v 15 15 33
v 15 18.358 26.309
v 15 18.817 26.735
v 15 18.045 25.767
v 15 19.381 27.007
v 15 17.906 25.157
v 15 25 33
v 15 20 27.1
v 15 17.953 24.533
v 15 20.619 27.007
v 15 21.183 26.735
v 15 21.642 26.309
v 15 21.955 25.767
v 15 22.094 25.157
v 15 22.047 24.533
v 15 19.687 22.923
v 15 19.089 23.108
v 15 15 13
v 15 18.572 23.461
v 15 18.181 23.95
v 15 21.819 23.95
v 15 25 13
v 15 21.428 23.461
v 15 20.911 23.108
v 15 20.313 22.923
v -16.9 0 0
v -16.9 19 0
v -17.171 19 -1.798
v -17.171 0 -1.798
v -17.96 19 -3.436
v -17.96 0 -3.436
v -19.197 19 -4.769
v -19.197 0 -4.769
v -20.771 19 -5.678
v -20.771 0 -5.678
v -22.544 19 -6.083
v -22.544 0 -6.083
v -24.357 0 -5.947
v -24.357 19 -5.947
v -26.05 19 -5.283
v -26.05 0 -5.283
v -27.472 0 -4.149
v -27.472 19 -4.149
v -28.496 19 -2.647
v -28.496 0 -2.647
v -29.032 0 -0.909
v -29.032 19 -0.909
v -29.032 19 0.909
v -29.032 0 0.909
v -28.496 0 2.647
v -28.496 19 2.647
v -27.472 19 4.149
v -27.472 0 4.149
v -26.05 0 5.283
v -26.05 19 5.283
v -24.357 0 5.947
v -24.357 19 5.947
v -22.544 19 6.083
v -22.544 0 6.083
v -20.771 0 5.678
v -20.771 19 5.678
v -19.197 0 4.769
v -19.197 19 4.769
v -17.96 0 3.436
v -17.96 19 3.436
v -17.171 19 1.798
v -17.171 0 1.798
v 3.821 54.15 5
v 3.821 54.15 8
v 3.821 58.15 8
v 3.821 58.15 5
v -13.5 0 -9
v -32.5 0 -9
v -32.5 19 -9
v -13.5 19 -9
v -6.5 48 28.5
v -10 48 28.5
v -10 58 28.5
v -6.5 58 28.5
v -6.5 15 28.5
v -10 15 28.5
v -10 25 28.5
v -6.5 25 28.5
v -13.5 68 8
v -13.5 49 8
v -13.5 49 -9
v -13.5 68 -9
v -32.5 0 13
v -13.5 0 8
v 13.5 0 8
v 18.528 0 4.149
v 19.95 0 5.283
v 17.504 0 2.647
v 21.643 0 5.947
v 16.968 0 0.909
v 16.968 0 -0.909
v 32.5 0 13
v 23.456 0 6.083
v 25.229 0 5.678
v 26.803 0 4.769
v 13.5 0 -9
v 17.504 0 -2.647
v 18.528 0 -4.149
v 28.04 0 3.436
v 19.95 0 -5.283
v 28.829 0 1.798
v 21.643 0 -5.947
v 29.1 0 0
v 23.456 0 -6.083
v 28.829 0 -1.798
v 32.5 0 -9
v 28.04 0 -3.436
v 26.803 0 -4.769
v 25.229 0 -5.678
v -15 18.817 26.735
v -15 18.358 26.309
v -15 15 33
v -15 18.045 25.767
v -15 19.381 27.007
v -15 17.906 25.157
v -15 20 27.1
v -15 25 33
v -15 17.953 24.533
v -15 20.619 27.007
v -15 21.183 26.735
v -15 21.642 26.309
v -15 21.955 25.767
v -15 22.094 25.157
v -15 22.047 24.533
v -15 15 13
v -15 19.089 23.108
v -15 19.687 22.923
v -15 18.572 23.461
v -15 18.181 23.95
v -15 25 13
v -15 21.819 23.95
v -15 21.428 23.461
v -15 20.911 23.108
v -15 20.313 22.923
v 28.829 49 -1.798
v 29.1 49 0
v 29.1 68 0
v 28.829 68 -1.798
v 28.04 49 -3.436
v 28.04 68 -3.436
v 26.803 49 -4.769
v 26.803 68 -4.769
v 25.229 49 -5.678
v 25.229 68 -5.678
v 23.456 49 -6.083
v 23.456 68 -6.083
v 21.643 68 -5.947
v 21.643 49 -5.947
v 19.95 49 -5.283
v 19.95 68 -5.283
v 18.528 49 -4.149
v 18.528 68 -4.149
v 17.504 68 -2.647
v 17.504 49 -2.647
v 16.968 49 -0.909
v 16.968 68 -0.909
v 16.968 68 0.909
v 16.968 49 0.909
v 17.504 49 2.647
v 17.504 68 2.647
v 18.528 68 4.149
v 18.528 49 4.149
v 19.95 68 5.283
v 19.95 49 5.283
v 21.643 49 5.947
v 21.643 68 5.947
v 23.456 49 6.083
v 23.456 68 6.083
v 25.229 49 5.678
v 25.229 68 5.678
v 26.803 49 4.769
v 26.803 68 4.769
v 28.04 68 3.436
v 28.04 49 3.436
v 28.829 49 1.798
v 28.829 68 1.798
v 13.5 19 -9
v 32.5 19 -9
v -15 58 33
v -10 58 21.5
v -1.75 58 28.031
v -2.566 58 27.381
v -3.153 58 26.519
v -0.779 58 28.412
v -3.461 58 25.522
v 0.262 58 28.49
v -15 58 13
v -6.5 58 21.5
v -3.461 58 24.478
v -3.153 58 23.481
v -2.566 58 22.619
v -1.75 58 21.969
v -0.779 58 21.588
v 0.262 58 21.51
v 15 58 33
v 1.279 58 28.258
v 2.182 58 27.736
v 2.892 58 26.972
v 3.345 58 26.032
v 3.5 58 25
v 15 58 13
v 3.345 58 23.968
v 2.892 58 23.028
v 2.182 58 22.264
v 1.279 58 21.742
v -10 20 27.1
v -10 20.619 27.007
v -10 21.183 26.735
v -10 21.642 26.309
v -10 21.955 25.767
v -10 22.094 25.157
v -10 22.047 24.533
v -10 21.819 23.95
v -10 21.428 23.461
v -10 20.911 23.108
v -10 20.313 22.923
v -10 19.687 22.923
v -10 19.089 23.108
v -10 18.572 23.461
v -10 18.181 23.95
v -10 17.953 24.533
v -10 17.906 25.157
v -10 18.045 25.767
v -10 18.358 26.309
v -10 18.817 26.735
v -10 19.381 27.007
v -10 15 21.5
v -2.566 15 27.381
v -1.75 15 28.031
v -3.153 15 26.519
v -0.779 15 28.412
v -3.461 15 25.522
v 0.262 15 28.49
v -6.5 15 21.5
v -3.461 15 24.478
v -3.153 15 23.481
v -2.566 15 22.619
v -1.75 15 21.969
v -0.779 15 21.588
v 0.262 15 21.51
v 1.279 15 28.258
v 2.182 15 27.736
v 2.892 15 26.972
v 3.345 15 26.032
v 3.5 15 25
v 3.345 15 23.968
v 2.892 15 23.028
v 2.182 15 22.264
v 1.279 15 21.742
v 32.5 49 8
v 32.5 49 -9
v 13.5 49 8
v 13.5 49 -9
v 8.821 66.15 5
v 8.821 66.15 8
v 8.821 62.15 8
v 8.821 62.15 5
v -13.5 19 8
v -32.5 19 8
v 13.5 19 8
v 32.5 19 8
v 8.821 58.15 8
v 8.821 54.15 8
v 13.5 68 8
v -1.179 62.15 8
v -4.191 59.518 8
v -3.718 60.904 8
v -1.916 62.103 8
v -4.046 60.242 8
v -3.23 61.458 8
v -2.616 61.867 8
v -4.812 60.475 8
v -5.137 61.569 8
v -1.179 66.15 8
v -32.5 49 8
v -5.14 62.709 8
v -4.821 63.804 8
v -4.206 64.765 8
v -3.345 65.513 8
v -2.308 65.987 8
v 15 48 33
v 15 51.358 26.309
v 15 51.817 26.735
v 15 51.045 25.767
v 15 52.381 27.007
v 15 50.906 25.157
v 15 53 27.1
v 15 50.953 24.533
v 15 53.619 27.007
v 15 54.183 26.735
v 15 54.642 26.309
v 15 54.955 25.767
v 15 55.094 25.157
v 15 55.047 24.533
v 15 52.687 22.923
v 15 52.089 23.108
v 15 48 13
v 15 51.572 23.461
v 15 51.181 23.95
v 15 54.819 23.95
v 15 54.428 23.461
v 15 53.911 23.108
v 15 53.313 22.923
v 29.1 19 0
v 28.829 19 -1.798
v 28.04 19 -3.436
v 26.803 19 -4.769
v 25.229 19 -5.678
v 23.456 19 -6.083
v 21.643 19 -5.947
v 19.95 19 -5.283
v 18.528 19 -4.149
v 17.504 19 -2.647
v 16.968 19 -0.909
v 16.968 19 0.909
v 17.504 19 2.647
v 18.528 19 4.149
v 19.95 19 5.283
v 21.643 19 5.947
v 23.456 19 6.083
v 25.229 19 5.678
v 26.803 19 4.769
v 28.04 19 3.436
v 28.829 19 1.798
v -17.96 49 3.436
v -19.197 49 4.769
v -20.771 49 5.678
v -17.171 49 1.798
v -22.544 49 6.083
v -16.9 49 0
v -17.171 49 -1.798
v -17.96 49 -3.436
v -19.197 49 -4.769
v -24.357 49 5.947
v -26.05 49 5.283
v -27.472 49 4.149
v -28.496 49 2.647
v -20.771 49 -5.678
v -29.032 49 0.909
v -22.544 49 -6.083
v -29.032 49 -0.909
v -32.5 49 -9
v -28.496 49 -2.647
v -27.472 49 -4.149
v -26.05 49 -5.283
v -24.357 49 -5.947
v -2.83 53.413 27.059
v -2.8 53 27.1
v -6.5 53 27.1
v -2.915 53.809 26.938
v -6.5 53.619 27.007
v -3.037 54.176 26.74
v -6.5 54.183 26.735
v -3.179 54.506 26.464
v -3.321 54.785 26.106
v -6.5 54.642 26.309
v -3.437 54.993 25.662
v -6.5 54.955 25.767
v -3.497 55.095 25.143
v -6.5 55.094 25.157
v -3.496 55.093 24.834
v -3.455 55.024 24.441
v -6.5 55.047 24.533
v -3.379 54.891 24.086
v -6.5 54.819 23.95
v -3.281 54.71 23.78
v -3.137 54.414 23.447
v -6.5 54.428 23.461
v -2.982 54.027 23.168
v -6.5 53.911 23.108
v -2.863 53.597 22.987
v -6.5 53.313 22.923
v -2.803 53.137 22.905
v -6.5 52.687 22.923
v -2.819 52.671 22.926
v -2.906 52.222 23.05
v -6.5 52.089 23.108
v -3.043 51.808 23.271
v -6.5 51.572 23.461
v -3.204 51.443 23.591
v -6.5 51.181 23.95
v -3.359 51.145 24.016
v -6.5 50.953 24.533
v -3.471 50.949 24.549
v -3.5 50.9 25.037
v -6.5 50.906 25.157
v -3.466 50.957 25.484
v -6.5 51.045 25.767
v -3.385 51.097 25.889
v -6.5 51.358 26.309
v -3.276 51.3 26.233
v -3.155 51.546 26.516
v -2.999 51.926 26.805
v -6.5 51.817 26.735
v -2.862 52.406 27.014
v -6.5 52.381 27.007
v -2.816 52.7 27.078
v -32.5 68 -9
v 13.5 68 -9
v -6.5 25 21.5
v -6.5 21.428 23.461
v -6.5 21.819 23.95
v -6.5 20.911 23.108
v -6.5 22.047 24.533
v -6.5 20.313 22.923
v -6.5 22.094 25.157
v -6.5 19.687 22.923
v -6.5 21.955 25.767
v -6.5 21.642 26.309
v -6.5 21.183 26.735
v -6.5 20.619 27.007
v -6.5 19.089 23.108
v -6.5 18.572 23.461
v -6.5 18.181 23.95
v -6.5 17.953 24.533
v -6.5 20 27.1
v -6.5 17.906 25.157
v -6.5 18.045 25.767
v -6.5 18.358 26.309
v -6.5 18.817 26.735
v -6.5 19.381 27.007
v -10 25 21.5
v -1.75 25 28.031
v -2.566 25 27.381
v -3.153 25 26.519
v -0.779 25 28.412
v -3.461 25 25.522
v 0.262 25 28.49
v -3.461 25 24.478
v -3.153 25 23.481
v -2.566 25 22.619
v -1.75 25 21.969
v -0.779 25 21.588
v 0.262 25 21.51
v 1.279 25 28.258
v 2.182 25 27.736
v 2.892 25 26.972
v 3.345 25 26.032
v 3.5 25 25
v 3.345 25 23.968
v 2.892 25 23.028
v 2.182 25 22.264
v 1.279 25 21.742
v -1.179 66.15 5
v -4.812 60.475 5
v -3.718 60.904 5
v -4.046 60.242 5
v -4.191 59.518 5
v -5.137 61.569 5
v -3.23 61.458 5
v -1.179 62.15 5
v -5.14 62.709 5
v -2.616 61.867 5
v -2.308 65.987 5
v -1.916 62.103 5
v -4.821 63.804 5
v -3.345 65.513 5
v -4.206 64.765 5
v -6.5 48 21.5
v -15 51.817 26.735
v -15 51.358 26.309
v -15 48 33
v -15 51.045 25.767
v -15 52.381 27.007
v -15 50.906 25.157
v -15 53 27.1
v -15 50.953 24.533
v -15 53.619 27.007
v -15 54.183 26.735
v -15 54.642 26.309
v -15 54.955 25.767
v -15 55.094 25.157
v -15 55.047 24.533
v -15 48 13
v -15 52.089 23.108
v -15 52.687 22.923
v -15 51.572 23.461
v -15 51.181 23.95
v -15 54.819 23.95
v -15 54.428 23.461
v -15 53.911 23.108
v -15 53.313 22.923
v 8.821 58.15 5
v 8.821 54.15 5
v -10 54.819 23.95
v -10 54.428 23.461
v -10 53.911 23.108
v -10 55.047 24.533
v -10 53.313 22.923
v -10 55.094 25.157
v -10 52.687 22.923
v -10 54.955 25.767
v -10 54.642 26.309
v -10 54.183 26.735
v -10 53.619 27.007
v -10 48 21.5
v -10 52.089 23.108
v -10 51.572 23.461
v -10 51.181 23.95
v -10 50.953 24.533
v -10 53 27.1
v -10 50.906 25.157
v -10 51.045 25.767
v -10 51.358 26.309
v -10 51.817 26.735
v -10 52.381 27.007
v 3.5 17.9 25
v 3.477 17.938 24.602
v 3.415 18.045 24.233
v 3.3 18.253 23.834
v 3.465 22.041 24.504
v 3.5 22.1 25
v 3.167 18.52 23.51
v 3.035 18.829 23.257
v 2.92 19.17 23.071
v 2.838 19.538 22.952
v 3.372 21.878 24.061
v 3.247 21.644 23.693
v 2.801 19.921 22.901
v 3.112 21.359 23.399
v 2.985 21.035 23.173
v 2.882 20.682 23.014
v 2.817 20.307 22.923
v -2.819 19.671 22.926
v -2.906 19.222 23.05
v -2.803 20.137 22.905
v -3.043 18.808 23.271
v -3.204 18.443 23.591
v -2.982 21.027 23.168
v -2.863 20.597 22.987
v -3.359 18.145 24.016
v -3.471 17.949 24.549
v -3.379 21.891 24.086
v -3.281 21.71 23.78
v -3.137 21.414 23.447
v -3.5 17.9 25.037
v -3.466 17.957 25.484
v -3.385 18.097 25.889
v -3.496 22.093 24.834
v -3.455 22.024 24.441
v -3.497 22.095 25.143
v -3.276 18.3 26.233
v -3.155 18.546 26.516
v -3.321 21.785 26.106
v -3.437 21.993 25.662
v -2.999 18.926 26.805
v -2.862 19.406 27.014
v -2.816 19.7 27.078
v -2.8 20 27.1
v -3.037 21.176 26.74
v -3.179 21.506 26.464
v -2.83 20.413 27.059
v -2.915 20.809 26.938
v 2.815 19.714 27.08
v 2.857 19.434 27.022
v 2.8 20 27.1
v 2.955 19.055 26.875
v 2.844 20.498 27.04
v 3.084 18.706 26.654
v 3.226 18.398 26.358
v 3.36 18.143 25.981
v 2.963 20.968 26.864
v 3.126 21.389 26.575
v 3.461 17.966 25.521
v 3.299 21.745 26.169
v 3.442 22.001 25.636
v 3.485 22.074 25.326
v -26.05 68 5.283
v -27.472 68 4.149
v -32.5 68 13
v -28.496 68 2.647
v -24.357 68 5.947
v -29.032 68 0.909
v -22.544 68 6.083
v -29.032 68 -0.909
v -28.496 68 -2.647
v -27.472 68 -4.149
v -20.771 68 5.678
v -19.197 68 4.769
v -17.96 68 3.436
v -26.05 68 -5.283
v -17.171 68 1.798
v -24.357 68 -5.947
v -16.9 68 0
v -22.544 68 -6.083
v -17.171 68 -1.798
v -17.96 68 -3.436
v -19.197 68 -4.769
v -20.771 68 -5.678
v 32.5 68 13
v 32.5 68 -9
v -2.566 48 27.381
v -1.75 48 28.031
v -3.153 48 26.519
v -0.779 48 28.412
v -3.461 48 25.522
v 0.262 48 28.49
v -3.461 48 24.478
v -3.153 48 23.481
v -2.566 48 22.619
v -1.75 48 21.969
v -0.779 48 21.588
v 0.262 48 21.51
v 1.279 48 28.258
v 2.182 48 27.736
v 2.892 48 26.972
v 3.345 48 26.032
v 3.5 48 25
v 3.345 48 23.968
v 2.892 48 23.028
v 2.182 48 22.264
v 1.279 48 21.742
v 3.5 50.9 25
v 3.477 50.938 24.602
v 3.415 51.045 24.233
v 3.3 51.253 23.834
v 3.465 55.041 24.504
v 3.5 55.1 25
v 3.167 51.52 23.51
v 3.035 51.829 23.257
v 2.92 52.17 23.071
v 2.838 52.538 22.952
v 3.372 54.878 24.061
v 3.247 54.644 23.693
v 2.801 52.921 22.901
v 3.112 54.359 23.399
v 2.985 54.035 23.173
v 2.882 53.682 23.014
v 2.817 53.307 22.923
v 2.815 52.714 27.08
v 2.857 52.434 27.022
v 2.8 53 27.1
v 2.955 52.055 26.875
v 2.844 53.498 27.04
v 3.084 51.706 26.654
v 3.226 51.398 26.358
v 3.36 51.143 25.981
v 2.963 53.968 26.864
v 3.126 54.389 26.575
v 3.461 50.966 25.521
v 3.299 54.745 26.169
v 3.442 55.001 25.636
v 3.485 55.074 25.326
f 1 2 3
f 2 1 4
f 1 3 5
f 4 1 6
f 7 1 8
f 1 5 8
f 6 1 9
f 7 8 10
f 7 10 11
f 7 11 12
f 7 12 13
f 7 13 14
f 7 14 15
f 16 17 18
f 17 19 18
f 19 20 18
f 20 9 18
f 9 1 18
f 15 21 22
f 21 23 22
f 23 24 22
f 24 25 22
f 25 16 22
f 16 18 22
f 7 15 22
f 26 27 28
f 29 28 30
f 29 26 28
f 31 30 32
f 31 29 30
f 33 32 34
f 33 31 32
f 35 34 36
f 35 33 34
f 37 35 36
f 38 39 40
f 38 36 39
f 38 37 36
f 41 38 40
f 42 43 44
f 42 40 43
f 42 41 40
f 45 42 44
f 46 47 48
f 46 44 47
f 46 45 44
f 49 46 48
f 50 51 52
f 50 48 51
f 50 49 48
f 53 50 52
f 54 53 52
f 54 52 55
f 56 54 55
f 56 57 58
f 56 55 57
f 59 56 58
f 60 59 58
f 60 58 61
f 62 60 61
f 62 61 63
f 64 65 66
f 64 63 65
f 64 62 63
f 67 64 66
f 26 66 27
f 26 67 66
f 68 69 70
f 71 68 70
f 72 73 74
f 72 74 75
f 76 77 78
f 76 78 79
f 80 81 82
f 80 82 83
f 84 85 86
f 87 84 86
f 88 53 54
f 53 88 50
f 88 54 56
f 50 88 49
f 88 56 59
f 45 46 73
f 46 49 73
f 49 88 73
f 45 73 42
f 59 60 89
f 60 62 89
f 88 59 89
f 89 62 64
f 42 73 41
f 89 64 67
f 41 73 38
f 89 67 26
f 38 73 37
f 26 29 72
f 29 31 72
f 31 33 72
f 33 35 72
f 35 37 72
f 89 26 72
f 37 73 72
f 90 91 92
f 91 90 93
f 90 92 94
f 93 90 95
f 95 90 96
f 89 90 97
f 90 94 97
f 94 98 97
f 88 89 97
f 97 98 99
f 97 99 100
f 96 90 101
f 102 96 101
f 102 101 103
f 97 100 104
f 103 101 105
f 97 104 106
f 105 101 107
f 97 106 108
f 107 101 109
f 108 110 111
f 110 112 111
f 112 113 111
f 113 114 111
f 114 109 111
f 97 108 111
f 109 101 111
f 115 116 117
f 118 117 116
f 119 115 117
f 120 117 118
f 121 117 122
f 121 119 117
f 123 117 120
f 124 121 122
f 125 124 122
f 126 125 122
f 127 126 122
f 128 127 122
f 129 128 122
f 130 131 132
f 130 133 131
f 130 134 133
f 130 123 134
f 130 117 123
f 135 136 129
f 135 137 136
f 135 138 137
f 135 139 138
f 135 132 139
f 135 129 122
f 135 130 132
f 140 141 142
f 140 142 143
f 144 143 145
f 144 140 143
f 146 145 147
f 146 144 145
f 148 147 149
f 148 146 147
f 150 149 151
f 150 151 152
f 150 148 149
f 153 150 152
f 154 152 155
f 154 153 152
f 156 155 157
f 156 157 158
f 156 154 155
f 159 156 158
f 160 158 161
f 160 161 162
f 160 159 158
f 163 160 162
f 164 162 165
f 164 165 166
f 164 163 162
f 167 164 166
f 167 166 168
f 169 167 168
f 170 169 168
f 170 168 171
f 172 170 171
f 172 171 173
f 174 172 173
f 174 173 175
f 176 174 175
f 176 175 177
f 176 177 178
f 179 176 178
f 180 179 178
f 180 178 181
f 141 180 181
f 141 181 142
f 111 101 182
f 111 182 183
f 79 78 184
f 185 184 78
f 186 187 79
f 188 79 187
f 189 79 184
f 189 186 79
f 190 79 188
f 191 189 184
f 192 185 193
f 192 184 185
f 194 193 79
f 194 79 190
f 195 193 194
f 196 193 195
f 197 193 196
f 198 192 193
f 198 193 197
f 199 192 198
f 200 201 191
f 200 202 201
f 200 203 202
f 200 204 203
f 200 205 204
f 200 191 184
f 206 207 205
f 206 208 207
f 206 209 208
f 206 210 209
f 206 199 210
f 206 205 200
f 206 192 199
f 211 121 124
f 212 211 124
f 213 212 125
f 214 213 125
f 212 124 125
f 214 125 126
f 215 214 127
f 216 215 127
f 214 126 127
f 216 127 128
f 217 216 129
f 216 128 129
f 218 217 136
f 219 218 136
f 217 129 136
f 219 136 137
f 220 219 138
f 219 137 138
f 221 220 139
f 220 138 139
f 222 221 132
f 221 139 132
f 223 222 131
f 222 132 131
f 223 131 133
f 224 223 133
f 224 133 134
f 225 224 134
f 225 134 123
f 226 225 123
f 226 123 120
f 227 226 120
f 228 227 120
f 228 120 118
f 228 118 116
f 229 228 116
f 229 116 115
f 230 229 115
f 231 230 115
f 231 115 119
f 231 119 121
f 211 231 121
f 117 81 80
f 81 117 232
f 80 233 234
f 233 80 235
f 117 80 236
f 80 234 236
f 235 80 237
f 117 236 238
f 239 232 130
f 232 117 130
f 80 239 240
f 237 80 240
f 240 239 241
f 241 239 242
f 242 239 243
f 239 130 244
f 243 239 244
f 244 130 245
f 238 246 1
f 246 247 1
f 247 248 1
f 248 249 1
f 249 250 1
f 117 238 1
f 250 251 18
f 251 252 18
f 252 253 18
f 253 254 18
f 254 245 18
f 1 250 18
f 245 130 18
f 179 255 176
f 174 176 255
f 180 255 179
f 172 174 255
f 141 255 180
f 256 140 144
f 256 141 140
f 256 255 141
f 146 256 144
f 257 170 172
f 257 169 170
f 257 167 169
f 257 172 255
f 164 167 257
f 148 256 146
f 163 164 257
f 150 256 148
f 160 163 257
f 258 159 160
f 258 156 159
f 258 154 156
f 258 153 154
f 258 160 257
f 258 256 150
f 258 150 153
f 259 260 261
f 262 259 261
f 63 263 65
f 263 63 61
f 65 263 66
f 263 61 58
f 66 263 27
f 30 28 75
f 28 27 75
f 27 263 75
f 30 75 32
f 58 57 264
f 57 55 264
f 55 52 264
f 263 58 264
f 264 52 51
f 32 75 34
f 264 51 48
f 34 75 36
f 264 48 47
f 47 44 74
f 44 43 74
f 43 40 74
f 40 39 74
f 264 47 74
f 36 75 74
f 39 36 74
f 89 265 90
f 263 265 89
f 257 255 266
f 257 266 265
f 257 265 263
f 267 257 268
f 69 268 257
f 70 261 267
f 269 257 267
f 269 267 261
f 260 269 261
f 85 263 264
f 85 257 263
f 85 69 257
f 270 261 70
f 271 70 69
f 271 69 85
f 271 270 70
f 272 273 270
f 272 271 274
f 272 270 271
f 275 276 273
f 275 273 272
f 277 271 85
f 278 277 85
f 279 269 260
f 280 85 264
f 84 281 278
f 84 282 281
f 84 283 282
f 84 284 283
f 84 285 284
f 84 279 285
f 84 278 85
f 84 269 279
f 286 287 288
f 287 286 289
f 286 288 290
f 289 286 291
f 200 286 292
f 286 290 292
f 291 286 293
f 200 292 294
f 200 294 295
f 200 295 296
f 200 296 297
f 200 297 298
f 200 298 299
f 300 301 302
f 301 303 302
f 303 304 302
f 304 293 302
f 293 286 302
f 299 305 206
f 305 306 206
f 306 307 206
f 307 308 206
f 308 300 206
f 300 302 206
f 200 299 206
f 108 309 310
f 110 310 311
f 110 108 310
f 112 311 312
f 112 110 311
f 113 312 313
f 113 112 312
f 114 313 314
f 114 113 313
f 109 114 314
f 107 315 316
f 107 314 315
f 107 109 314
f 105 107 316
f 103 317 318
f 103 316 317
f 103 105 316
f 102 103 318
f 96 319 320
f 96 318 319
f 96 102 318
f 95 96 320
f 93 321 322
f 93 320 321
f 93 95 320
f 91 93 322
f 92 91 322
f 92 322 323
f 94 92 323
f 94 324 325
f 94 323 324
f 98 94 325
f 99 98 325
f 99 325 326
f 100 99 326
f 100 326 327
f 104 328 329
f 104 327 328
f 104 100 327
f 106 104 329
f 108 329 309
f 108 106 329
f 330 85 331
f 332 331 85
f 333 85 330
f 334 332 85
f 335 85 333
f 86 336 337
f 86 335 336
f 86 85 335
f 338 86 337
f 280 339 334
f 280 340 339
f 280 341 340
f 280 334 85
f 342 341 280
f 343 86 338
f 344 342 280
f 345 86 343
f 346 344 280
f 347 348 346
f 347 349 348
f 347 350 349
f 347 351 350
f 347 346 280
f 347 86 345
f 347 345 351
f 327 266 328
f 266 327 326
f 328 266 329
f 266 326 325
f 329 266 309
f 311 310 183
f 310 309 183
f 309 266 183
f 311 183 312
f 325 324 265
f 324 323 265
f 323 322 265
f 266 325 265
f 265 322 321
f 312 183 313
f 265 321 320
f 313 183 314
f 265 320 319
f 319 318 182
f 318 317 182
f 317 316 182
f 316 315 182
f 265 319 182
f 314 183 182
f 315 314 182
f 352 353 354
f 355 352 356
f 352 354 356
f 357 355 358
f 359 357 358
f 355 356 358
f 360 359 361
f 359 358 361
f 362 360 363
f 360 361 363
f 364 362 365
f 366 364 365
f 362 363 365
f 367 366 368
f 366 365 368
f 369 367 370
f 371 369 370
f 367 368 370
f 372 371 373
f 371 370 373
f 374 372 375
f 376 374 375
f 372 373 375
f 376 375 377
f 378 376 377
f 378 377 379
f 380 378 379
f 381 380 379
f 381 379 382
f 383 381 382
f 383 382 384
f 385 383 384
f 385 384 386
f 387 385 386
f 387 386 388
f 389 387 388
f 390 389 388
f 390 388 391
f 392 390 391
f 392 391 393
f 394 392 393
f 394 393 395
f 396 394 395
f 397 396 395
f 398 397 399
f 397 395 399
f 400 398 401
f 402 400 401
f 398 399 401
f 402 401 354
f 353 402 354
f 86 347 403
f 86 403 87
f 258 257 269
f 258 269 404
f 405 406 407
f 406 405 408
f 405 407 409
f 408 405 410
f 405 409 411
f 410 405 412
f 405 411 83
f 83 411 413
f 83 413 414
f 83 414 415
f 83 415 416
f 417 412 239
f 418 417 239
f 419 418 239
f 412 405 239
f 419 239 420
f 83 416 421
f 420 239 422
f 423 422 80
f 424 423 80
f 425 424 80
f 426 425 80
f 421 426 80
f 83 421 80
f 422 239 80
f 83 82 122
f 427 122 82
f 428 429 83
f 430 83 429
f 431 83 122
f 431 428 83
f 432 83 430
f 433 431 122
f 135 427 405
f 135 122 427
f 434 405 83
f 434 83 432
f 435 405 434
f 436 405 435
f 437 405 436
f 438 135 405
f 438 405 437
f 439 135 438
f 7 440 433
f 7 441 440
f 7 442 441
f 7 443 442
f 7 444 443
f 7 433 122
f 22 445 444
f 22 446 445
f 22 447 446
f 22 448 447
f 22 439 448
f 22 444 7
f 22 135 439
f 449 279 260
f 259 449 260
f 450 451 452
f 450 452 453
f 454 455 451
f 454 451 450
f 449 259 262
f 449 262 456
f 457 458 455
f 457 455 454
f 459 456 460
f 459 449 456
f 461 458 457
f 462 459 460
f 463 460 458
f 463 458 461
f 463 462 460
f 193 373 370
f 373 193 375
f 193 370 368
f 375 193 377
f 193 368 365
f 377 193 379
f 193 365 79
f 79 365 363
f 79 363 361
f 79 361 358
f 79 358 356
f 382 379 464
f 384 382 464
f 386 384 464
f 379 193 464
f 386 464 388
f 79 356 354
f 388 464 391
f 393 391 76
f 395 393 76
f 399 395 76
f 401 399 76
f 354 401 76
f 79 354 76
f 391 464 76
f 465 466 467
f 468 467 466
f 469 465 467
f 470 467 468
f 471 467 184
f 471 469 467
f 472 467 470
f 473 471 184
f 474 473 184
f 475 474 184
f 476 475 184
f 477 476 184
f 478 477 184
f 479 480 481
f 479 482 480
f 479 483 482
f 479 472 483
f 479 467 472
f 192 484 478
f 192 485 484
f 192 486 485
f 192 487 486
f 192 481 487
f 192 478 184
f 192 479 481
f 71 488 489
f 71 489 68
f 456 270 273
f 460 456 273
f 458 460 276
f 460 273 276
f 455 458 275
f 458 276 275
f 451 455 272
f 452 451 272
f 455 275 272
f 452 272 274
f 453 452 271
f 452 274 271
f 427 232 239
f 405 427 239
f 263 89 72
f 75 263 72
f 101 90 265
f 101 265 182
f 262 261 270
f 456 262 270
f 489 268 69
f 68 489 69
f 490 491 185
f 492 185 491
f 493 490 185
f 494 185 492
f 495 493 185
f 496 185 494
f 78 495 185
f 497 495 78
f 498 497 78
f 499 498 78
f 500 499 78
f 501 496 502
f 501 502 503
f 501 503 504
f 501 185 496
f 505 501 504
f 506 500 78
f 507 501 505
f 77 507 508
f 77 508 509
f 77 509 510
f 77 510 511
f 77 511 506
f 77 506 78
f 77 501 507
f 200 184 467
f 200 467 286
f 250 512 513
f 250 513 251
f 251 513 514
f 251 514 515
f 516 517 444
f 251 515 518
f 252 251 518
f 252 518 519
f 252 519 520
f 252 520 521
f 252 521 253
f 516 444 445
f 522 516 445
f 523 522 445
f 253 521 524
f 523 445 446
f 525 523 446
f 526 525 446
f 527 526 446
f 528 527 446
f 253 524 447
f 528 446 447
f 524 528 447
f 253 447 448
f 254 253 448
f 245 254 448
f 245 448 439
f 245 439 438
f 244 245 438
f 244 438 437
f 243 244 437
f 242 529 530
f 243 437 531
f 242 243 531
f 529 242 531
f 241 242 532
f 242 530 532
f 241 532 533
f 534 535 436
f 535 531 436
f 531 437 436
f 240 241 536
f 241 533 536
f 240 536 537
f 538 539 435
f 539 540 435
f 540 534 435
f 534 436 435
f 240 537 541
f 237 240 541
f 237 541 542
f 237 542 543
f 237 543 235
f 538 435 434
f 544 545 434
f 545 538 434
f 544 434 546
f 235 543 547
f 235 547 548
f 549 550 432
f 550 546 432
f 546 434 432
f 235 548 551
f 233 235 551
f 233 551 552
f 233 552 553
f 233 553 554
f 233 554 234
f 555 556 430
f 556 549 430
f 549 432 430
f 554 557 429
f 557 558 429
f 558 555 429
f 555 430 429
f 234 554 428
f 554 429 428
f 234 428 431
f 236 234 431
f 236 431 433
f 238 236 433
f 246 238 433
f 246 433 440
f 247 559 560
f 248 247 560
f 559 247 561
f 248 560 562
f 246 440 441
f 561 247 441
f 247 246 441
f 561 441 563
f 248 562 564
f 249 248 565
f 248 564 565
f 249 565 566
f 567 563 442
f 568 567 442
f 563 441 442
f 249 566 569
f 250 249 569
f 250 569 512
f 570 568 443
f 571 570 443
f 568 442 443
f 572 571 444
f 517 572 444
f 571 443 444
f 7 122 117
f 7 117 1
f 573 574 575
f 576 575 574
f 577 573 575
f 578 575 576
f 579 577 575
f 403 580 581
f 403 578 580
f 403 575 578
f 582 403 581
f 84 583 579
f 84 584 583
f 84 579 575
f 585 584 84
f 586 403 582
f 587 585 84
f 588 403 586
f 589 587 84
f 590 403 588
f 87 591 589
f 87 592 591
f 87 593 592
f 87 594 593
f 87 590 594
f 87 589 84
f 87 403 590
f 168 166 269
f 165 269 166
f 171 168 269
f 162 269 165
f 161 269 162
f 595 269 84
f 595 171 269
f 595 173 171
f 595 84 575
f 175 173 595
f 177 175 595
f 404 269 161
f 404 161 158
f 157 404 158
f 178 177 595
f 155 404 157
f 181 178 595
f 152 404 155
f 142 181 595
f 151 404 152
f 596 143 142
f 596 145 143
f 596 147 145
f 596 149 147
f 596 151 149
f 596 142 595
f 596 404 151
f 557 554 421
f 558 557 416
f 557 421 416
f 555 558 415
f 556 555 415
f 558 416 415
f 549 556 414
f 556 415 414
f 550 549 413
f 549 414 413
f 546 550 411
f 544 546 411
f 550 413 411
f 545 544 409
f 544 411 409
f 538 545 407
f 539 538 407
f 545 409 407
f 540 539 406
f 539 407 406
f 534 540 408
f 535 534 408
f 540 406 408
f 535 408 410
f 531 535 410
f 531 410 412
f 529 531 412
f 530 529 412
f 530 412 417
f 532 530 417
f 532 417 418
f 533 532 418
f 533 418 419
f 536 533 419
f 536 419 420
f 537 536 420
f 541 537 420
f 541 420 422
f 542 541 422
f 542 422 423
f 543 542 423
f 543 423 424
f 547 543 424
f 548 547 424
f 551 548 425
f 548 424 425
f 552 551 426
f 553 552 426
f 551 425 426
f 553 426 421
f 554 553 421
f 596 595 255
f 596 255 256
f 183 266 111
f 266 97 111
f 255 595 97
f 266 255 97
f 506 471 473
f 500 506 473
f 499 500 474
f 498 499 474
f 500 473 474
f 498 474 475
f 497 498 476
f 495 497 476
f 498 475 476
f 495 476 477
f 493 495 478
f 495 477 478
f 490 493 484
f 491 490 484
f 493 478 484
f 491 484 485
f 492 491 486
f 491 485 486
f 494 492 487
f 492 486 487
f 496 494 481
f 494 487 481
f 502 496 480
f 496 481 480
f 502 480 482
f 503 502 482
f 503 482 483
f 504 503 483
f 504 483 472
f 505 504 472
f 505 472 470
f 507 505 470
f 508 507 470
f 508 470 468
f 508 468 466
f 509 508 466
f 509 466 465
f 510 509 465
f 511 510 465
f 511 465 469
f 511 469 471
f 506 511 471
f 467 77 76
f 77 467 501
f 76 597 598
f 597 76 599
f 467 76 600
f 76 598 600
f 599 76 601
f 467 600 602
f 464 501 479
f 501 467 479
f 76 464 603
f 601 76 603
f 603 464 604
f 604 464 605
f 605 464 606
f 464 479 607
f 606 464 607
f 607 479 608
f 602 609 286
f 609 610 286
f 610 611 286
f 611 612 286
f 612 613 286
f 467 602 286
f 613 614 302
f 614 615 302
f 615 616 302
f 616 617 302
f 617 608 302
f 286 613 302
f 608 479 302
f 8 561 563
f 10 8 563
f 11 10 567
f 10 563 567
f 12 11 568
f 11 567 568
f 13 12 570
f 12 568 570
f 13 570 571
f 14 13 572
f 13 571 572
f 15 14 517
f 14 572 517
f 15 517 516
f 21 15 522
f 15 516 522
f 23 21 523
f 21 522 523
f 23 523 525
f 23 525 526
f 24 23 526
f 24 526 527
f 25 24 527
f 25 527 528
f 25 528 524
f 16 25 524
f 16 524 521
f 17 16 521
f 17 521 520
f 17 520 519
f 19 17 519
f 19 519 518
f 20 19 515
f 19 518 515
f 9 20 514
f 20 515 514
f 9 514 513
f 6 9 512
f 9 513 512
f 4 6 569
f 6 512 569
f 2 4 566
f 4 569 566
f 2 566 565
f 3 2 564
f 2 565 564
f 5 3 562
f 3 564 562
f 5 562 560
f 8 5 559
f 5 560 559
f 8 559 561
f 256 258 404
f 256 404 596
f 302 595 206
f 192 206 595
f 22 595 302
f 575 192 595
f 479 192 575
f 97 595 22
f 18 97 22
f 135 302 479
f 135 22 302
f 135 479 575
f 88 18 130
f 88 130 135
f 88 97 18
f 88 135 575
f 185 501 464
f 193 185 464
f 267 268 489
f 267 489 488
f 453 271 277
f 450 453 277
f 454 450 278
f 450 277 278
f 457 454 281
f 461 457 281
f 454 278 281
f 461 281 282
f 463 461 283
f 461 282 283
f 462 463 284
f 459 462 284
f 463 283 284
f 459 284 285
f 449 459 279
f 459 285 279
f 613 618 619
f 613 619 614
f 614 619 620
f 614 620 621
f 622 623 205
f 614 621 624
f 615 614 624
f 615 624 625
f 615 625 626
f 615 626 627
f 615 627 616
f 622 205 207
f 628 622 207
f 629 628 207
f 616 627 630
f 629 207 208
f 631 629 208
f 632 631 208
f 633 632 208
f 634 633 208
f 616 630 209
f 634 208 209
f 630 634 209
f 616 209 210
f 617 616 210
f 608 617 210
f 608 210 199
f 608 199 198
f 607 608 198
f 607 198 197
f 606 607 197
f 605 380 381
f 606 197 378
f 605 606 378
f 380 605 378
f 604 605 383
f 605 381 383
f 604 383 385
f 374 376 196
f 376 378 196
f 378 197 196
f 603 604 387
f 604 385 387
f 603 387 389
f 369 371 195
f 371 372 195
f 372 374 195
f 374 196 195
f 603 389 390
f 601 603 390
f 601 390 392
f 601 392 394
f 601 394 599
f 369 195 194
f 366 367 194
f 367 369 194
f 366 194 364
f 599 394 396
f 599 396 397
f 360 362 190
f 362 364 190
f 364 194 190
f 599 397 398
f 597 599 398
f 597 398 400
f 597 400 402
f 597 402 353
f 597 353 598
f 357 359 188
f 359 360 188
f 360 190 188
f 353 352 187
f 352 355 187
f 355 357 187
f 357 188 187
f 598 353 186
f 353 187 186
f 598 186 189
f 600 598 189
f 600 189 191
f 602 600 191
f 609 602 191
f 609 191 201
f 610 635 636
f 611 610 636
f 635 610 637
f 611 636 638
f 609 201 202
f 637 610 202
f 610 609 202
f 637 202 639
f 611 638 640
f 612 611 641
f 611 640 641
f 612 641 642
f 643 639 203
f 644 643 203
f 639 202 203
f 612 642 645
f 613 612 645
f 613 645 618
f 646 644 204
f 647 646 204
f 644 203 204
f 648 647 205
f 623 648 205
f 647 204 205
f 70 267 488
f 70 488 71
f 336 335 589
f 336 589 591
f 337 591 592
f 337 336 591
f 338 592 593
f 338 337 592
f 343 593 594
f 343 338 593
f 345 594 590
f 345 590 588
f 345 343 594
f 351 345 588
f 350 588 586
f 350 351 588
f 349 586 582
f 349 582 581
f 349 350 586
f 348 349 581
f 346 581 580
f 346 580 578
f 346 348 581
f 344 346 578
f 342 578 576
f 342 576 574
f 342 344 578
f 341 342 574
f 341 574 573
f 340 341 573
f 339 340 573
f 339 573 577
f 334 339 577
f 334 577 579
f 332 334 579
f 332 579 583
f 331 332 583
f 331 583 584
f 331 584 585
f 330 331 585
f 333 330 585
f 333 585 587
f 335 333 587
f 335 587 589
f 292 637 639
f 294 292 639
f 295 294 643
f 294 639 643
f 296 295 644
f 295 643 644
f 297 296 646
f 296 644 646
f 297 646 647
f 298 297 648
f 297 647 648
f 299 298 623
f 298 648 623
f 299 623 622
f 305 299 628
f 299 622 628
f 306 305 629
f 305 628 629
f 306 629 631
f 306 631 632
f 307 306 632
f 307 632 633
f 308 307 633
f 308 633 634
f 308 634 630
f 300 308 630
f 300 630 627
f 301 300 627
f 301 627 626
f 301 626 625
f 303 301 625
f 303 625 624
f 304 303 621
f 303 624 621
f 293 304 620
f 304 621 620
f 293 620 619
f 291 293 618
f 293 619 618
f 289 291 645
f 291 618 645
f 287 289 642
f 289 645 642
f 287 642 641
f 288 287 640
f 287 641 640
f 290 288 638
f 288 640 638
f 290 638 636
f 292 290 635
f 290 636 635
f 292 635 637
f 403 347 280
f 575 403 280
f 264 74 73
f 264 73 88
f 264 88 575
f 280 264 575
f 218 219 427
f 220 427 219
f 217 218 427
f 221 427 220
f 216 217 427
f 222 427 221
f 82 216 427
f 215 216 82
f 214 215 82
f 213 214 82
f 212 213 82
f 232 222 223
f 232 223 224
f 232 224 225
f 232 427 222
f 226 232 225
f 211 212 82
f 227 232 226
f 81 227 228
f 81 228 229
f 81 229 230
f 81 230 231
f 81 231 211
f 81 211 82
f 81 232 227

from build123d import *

# Parameters (mm, degrees)
SKETCH1_W           = 19
SKETCH1_H           = 17
SKETCH1_R           = 6.1
BOSS_EXTRUDE1_DEPTH = 68
SKETCH3_W           = 65
SKETCH3_H           = 30
CUT_EXTRUDE1_DEPTH  = 17
SKETCH4_W           = 5
SKETCH4_H           = 4
BOSS_EXTRUDE2_DEPTH = 3
SKETCH5_W           = 30
SKETCH5_H           = 10
BOSS_EXTRUDE3_DEPTH = 20
SKETCH6_R           = 3.5
CUT_EXTRUDE2_DEPTH  = 59
SKETCH8_R           = 2.1
CUT_EXTRUDE3_DEPTH  = 48.5
SKETCH9_W           = 3.5
SKETCH9_H           = 7
CUT_EXTRUDE4_DEPTH  = 43


with BuildPart() as part:
    # Sketch1 → Boss-Extrude1 (new body)
    with BuildSketch(Plane(origin=(0, 0, 0), x_dir=(1, 0, 0), z_dir=(0, 1, 0))):
        with Locations((-23, 0.5)):
            Rectangle(SKETCH1_W, SKETCH1_H)
        with Locations((-23, 0)):
            Circle(SKETCH1_R, mode=Mode.SUBTRACT)
        with Locations((23, 0.5)):
            Rectangle(SKETCH1_W, SKETCH1_H)
        with Locations((23, 0)):
            Circle(SKETCH1_R, mode=Mode.SUBTRACT)
        Polygon((-13.5, -8), (13.5, -8), (32.5, -8), (32.5, -13), (-32.5, -13), (-32.5, -8), align=None)
    extrude(amount=BOSS_EXTRUDE1_DEPTH)

    # Sketch3 → Cut-Extrude1 (cut)
    with BuildSketch(Plane(origin=(0, 0, -9), x_dir=(-1, 0, 0), z_dir=(0, 0, -1))):
        with Locations((0, 34)):
            Rectangle(SKETCH3_W, SKETCH3_H)
    extrude(amount=-CUT_EXTRUDE1_DEPTH, mode=Mode.SUBTRACT)

    # Sketch4 → Boss-Extrude2 (add)
    with BuildSketch(Plane(origin=(0, 0, 8), x_dir=(-1, 0, 0), z_dir=(0, 0, -1))):
        with BuildLine():
            ThreePointArc((4.191236083, 59.518146972), (4.82097308, 63.804174702), (1.17903595, 66.15))
            Line((1.17903595, 66.15), (-8.82096405, 66.15))
            Line((-8.82096405, 66.15), (-8.82096405, 62.15))
            Line((-8.82096405, 62.15), (1.17903595, 62.15))
            ThreePointArc((1.17903595, 62.15), (3.230210626, 61.45792056), (4.191236083, 59.518146972))
        make_face()
        with Locations((-6.32096405, 56.15)):
            Rectangle(SKETCH4_W, SKETCH4_H)
    extrude(amount=BOSS_EXTRUDE2_DEPTH)

    # Sketch5 → Boss-Extrude3 (add)
    with BuildSketch(Plane.XY.offset(13)):
        with Locations((0, 20)):
            Rectangle(SKETCH5_W, SKETCH5_H)
        with Locations((0, 53)):
            Rectangle(SKETCH5_W, SKETCH5_H)
    extrude(amount=BOSS_EXTRUDE3_DEPTH)

    # Sketch6 → Cut-Extrude2 (cut, through all)
    with BuildSketch(Plane(origin=(0, 58, 0), x_dir=(1, 0, 0), z_dir=(0, 1, 0))):
        with Locations((0, -25)):
            Circle(SKETCH6_R)
    extrude(amount=-CUT_EXTRUDE2_DEPTH, mode=Mode.SUBTRACT)

    # Sketch8 → Cut-Extrude3 (cut, through all)
    with BuildSketch(Plane.ZY.offset(15)):
        with Locations((25, 20)):
            Circle(SKETCH8_R)
        with Locations((25, 53)):
            Circle(SKETCH8_R)
    extrude(amount=-CUT_EXTRUDE3_DEPTH, mode=Mode.SUBTRACT)

    # Sketch9 → Cut-Extrude4 (cut)
    with BuildSketch(Plane.XZ.offset(-15)):
        with Locations((-8.25, 25)):
            Rectangle(SKETCH9_W, SKETCH9_H)
    extrude(amount=-CUT_EXTRUDE4_DEPTH, mode=Mode.SUBTRACT)


solid = part.part
